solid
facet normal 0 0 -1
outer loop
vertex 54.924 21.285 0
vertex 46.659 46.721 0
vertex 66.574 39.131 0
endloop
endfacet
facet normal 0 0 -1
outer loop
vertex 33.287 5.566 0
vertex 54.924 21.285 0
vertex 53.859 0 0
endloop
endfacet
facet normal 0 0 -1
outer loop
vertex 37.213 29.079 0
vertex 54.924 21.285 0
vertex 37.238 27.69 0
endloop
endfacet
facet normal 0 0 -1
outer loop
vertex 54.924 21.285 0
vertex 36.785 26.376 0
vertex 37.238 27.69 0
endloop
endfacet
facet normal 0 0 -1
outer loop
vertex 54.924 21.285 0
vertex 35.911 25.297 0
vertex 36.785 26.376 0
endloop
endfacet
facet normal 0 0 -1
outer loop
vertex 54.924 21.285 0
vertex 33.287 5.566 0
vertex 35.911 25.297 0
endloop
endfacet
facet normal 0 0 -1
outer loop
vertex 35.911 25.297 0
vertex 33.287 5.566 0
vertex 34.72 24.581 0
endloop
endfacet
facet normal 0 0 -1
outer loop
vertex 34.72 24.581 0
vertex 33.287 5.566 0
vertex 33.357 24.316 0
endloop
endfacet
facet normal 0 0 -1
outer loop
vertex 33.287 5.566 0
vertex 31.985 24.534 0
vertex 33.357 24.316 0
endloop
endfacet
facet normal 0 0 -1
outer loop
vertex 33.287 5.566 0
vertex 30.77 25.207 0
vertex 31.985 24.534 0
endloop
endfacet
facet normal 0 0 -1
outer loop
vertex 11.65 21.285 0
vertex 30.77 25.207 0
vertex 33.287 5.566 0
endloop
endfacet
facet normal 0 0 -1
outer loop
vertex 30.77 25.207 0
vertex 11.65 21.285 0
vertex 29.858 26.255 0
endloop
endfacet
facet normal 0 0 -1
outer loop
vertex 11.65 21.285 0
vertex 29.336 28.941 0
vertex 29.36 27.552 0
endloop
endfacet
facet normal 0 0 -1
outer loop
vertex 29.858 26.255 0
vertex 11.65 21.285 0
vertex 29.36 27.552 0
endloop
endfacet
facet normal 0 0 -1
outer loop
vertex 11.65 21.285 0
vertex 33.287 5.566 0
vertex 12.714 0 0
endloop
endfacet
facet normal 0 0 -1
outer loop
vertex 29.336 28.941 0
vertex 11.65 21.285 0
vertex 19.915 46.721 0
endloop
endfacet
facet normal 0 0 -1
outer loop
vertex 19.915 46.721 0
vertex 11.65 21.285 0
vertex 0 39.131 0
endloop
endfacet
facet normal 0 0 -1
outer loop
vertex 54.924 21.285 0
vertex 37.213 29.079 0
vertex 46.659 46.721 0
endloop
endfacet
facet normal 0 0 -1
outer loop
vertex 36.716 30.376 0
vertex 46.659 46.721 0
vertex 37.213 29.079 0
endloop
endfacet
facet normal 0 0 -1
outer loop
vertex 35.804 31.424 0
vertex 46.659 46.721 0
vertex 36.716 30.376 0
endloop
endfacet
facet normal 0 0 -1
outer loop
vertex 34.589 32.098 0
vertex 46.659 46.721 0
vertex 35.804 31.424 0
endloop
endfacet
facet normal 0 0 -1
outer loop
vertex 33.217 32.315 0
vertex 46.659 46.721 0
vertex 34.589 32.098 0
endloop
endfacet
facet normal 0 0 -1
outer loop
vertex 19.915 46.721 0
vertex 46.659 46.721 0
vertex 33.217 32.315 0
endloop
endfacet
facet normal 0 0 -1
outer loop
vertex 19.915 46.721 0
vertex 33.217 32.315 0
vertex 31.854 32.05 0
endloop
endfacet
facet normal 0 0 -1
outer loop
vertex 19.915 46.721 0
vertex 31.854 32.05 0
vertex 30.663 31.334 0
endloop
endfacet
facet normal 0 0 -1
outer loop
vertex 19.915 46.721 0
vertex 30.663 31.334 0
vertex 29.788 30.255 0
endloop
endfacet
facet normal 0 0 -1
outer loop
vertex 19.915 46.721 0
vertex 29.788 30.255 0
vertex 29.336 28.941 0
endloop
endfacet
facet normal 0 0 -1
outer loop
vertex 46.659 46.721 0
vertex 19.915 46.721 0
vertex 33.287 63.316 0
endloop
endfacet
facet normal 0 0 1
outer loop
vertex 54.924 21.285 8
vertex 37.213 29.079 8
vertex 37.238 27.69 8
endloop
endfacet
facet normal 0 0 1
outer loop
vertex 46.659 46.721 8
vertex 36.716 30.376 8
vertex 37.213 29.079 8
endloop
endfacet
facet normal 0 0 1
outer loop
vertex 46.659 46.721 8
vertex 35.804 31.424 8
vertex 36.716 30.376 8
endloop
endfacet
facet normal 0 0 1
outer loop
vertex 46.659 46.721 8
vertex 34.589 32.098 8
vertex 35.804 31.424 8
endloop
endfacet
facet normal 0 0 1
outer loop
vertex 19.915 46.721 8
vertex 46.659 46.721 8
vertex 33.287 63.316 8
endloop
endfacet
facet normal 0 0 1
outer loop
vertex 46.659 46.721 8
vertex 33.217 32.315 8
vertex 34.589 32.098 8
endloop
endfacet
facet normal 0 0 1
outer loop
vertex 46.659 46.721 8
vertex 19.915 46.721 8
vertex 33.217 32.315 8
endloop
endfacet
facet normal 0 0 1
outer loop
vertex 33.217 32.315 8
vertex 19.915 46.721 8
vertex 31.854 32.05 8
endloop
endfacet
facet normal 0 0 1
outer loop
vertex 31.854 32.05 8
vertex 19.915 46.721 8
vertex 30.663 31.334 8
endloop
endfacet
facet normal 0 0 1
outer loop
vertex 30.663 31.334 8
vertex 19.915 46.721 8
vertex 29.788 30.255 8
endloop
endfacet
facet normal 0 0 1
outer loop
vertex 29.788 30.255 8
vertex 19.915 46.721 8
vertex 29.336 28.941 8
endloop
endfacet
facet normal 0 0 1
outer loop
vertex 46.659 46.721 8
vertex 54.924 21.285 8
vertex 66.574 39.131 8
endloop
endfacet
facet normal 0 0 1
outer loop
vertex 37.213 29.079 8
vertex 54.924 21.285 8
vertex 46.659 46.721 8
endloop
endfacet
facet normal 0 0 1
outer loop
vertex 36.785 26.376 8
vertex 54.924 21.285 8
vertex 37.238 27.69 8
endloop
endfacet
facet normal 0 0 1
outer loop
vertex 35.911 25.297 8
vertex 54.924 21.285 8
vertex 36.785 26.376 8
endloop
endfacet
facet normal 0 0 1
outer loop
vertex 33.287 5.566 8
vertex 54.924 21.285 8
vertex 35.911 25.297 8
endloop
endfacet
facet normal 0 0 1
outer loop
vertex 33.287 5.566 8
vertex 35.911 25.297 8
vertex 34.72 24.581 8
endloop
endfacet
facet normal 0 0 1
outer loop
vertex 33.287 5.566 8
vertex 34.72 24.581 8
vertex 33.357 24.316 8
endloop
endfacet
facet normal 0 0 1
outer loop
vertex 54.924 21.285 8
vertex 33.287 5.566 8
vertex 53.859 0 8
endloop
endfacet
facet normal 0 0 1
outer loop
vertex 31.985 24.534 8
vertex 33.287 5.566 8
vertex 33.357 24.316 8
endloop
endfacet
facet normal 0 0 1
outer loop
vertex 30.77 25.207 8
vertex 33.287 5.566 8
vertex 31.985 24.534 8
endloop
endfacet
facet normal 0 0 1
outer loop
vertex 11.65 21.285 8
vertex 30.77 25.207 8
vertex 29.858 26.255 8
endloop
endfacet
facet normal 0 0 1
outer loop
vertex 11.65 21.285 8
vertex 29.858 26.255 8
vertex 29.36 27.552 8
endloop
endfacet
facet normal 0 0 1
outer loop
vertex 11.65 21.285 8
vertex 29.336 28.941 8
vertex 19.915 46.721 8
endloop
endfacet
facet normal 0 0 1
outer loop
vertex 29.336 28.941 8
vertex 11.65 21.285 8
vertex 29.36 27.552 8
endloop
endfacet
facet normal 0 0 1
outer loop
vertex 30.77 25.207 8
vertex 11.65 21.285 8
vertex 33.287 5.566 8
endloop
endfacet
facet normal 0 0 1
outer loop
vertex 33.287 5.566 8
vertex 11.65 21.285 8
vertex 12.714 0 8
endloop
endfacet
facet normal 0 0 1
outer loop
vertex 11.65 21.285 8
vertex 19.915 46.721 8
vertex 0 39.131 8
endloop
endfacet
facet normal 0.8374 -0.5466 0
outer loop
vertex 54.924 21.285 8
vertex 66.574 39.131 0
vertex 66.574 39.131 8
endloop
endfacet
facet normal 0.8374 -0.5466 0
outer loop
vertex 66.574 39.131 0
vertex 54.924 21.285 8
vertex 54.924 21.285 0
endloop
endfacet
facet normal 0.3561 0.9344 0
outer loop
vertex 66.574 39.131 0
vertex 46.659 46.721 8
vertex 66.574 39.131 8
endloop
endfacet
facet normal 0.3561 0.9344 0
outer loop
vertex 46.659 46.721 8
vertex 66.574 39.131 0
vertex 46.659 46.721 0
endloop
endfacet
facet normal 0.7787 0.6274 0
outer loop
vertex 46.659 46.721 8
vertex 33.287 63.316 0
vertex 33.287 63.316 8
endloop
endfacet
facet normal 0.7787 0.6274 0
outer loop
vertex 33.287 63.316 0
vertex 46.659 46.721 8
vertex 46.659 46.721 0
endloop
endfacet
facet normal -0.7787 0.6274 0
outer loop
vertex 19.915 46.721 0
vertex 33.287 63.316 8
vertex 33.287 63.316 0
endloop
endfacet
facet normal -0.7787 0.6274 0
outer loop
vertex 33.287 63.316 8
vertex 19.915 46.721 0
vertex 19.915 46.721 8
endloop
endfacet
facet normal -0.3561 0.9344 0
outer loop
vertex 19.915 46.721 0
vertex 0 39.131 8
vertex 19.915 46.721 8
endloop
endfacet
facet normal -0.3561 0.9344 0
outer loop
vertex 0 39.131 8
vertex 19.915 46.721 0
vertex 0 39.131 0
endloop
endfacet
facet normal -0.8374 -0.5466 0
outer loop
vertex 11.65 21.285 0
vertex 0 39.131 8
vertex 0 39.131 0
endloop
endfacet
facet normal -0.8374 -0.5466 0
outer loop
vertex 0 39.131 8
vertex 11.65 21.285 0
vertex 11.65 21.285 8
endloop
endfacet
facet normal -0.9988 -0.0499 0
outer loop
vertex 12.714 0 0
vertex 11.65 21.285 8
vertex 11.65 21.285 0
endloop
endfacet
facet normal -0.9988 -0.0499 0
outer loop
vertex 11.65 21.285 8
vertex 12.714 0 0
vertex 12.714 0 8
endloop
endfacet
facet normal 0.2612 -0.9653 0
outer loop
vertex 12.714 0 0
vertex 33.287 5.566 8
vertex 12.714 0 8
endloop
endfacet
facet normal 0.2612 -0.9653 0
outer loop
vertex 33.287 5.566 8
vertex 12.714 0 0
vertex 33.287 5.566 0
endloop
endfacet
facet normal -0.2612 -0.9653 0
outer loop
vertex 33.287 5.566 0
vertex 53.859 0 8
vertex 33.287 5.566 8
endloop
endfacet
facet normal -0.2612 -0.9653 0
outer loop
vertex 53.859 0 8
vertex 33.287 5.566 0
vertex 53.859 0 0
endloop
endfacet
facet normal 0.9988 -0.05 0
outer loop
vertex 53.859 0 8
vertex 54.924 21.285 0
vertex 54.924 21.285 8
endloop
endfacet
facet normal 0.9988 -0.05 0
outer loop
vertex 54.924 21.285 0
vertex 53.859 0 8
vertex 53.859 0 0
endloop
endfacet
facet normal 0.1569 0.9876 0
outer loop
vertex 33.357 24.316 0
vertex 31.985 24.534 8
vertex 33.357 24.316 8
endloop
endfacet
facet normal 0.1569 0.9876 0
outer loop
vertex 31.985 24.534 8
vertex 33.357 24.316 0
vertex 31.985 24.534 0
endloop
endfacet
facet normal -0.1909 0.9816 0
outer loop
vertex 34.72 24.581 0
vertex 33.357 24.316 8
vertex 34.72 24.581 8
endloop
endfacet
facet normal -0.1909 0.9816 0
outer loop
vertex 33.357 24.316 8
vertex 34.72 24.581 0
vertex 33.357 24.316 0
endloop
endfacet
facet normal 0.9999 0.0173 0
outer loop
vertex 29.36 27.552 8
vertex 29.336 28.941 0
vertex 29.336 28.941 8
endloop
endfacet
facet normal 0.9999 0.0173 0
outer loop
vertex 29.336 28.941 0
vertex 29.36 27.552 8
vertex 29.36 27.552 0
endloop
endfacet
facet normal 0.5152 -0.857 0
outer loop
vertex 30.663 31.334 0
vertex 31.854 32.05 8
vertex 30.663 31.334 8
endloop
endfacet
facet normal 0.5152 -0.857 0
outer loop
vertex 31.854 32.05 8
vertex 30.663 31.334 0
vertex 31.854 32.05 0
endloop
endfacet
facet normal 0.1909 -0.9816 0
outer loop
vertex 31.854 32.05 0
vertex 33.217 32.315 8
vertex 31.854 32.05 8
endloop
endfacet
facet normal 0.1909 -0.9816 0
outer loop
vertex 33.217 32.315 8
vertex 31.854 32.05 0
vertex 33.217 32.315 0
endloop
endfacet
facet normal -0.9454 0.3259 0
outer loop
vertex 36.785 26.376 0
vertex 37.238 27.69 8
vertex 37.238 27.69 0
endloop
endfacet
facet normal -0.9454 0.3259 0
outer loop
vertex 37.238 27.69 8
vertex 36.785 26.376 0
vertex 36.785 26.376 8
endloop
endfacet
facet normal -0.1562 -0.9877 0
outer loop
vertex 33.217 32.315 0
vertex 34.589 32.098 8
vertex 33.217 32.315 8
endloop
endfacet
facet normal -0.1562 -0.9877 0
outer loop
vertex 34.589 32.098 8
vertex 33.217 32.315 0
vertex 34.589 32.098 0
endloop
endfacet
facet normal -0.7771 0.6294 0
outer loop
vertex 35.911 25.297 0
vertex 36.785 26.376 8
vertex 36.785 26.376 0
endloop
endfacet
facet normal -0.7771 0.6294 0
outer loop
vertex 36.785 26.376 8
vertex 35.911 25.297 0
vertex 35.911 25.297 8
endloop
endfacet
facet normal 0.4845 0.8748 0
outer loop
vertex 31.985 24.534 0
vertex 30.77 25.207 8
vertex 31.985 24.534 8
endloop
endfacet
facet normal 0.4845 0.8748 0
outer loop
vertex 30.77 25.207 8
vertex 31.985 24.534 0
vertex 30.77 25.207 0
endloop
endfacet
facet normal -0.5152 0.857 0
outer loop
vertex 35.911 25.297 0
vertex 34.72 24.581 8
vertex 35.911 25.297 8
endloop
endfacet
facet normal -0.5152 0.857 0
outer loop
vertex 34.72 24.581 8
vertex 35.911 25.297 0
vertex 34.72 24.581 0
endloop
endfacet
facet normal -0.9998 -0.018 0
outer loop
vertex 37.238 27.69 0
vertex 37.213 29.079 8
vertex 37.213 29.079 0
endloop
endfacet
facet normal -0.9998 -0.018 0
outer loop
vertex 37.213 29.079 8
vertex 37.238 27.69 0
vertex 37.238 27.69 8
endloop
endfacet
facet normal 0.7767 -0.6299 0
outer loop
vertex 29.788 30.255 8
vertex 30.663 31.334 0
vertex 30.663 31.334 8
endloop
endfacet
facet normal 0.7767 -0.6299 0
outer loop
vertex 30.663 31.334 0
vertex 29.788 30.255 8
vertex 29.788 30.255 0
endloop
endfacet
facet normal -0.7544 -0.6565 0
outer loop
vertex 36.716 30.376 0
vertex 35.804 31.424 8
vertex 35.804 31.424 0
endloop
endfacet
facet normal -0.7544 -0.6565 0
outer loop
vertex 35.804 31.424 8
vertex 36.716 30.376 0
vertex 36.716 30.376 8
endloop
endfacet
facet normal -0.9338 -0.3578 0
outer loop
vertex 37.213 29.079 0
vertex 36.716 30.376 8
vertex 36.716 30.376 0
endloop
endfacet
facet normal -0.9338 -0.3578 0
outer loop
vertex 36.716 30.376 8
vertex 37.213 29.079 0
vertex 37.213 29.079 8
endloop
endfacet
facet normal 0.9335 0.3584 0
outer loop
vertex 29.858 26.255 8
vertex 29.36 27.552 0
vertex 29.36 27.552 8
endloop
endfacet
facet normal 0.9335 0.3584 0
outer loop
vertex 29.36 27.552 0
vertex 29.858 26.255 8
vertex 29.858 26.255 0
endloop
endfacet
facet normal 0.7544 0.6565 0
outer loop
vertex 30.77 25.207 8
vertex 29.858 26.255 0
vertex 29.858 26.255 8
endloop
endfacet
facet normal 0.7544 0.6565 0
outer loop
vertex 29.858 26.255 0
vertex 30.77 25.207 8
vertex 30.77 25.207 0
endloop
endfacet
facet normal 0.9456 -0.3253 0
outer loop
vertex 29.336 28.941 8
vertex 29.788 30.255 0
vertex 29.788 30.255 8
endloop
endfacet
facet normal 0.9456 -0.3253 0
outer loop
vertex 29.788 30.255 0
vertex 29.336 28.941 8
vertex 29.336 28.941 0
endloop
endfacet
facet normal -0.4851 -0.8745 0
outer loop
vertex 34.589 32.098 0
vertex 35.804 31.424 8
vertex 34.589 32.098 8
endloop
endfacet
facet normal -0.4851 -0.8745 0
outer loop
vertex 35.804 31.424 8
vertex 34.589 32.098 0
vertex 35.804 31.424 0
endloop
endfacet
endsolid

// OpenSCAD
$fn = 32;

// ----------------------------------------------------------------------
// Star wheel: 5-point blunt, R35
// ----------------------------------------------------------------------

// --- parameters (mm) ---
n_points = 5;             // number of points / teeth
r_out = 35;               // tip radius
r_in = 22.75;             // root radius
bore_r = 4;               // centre bore radius
plate_t = 8;              // plate thickness, Z (extrusion height)
bore_d = 8;               // centre bore diameter

profile = [[33.287, 63.316], [19.915, 46.721], [0, 39.131], [11.65, 21.285], [12.714, 0], [33.287, 5.566], [53.859, 0], [54.924, 21.285], [66.574, 39.131], [46.659, 46.721]];  // primary outline, 10 points, counter clockwise
void_1 = [[37.213, 29.079], [36.716, 30.376], [35.804, 31.424], [34.589, 32.098], [33.217, 32.315], [31.854, 32.05], [30.663, 31.334], [29.788, 30.255], [29.336, 28.941], [29.36, 27.552], [29.858, 26.255], [30.77, 25.207], [31.985, 24.534], [33.357, 24.316], [34.72, 24.581], [35.911, 25.297], [36.785, 26.376], [37.238, 27.69]];  // centre bore, 18 points

// --- the one profile operation ---
difference() {
  linear_extrude(height = plate_t) polygon(points = profile);
  translate([0, 0, -1])
    linear_extrude(height = plate_t + 2) polygon(points = void_1);
}
